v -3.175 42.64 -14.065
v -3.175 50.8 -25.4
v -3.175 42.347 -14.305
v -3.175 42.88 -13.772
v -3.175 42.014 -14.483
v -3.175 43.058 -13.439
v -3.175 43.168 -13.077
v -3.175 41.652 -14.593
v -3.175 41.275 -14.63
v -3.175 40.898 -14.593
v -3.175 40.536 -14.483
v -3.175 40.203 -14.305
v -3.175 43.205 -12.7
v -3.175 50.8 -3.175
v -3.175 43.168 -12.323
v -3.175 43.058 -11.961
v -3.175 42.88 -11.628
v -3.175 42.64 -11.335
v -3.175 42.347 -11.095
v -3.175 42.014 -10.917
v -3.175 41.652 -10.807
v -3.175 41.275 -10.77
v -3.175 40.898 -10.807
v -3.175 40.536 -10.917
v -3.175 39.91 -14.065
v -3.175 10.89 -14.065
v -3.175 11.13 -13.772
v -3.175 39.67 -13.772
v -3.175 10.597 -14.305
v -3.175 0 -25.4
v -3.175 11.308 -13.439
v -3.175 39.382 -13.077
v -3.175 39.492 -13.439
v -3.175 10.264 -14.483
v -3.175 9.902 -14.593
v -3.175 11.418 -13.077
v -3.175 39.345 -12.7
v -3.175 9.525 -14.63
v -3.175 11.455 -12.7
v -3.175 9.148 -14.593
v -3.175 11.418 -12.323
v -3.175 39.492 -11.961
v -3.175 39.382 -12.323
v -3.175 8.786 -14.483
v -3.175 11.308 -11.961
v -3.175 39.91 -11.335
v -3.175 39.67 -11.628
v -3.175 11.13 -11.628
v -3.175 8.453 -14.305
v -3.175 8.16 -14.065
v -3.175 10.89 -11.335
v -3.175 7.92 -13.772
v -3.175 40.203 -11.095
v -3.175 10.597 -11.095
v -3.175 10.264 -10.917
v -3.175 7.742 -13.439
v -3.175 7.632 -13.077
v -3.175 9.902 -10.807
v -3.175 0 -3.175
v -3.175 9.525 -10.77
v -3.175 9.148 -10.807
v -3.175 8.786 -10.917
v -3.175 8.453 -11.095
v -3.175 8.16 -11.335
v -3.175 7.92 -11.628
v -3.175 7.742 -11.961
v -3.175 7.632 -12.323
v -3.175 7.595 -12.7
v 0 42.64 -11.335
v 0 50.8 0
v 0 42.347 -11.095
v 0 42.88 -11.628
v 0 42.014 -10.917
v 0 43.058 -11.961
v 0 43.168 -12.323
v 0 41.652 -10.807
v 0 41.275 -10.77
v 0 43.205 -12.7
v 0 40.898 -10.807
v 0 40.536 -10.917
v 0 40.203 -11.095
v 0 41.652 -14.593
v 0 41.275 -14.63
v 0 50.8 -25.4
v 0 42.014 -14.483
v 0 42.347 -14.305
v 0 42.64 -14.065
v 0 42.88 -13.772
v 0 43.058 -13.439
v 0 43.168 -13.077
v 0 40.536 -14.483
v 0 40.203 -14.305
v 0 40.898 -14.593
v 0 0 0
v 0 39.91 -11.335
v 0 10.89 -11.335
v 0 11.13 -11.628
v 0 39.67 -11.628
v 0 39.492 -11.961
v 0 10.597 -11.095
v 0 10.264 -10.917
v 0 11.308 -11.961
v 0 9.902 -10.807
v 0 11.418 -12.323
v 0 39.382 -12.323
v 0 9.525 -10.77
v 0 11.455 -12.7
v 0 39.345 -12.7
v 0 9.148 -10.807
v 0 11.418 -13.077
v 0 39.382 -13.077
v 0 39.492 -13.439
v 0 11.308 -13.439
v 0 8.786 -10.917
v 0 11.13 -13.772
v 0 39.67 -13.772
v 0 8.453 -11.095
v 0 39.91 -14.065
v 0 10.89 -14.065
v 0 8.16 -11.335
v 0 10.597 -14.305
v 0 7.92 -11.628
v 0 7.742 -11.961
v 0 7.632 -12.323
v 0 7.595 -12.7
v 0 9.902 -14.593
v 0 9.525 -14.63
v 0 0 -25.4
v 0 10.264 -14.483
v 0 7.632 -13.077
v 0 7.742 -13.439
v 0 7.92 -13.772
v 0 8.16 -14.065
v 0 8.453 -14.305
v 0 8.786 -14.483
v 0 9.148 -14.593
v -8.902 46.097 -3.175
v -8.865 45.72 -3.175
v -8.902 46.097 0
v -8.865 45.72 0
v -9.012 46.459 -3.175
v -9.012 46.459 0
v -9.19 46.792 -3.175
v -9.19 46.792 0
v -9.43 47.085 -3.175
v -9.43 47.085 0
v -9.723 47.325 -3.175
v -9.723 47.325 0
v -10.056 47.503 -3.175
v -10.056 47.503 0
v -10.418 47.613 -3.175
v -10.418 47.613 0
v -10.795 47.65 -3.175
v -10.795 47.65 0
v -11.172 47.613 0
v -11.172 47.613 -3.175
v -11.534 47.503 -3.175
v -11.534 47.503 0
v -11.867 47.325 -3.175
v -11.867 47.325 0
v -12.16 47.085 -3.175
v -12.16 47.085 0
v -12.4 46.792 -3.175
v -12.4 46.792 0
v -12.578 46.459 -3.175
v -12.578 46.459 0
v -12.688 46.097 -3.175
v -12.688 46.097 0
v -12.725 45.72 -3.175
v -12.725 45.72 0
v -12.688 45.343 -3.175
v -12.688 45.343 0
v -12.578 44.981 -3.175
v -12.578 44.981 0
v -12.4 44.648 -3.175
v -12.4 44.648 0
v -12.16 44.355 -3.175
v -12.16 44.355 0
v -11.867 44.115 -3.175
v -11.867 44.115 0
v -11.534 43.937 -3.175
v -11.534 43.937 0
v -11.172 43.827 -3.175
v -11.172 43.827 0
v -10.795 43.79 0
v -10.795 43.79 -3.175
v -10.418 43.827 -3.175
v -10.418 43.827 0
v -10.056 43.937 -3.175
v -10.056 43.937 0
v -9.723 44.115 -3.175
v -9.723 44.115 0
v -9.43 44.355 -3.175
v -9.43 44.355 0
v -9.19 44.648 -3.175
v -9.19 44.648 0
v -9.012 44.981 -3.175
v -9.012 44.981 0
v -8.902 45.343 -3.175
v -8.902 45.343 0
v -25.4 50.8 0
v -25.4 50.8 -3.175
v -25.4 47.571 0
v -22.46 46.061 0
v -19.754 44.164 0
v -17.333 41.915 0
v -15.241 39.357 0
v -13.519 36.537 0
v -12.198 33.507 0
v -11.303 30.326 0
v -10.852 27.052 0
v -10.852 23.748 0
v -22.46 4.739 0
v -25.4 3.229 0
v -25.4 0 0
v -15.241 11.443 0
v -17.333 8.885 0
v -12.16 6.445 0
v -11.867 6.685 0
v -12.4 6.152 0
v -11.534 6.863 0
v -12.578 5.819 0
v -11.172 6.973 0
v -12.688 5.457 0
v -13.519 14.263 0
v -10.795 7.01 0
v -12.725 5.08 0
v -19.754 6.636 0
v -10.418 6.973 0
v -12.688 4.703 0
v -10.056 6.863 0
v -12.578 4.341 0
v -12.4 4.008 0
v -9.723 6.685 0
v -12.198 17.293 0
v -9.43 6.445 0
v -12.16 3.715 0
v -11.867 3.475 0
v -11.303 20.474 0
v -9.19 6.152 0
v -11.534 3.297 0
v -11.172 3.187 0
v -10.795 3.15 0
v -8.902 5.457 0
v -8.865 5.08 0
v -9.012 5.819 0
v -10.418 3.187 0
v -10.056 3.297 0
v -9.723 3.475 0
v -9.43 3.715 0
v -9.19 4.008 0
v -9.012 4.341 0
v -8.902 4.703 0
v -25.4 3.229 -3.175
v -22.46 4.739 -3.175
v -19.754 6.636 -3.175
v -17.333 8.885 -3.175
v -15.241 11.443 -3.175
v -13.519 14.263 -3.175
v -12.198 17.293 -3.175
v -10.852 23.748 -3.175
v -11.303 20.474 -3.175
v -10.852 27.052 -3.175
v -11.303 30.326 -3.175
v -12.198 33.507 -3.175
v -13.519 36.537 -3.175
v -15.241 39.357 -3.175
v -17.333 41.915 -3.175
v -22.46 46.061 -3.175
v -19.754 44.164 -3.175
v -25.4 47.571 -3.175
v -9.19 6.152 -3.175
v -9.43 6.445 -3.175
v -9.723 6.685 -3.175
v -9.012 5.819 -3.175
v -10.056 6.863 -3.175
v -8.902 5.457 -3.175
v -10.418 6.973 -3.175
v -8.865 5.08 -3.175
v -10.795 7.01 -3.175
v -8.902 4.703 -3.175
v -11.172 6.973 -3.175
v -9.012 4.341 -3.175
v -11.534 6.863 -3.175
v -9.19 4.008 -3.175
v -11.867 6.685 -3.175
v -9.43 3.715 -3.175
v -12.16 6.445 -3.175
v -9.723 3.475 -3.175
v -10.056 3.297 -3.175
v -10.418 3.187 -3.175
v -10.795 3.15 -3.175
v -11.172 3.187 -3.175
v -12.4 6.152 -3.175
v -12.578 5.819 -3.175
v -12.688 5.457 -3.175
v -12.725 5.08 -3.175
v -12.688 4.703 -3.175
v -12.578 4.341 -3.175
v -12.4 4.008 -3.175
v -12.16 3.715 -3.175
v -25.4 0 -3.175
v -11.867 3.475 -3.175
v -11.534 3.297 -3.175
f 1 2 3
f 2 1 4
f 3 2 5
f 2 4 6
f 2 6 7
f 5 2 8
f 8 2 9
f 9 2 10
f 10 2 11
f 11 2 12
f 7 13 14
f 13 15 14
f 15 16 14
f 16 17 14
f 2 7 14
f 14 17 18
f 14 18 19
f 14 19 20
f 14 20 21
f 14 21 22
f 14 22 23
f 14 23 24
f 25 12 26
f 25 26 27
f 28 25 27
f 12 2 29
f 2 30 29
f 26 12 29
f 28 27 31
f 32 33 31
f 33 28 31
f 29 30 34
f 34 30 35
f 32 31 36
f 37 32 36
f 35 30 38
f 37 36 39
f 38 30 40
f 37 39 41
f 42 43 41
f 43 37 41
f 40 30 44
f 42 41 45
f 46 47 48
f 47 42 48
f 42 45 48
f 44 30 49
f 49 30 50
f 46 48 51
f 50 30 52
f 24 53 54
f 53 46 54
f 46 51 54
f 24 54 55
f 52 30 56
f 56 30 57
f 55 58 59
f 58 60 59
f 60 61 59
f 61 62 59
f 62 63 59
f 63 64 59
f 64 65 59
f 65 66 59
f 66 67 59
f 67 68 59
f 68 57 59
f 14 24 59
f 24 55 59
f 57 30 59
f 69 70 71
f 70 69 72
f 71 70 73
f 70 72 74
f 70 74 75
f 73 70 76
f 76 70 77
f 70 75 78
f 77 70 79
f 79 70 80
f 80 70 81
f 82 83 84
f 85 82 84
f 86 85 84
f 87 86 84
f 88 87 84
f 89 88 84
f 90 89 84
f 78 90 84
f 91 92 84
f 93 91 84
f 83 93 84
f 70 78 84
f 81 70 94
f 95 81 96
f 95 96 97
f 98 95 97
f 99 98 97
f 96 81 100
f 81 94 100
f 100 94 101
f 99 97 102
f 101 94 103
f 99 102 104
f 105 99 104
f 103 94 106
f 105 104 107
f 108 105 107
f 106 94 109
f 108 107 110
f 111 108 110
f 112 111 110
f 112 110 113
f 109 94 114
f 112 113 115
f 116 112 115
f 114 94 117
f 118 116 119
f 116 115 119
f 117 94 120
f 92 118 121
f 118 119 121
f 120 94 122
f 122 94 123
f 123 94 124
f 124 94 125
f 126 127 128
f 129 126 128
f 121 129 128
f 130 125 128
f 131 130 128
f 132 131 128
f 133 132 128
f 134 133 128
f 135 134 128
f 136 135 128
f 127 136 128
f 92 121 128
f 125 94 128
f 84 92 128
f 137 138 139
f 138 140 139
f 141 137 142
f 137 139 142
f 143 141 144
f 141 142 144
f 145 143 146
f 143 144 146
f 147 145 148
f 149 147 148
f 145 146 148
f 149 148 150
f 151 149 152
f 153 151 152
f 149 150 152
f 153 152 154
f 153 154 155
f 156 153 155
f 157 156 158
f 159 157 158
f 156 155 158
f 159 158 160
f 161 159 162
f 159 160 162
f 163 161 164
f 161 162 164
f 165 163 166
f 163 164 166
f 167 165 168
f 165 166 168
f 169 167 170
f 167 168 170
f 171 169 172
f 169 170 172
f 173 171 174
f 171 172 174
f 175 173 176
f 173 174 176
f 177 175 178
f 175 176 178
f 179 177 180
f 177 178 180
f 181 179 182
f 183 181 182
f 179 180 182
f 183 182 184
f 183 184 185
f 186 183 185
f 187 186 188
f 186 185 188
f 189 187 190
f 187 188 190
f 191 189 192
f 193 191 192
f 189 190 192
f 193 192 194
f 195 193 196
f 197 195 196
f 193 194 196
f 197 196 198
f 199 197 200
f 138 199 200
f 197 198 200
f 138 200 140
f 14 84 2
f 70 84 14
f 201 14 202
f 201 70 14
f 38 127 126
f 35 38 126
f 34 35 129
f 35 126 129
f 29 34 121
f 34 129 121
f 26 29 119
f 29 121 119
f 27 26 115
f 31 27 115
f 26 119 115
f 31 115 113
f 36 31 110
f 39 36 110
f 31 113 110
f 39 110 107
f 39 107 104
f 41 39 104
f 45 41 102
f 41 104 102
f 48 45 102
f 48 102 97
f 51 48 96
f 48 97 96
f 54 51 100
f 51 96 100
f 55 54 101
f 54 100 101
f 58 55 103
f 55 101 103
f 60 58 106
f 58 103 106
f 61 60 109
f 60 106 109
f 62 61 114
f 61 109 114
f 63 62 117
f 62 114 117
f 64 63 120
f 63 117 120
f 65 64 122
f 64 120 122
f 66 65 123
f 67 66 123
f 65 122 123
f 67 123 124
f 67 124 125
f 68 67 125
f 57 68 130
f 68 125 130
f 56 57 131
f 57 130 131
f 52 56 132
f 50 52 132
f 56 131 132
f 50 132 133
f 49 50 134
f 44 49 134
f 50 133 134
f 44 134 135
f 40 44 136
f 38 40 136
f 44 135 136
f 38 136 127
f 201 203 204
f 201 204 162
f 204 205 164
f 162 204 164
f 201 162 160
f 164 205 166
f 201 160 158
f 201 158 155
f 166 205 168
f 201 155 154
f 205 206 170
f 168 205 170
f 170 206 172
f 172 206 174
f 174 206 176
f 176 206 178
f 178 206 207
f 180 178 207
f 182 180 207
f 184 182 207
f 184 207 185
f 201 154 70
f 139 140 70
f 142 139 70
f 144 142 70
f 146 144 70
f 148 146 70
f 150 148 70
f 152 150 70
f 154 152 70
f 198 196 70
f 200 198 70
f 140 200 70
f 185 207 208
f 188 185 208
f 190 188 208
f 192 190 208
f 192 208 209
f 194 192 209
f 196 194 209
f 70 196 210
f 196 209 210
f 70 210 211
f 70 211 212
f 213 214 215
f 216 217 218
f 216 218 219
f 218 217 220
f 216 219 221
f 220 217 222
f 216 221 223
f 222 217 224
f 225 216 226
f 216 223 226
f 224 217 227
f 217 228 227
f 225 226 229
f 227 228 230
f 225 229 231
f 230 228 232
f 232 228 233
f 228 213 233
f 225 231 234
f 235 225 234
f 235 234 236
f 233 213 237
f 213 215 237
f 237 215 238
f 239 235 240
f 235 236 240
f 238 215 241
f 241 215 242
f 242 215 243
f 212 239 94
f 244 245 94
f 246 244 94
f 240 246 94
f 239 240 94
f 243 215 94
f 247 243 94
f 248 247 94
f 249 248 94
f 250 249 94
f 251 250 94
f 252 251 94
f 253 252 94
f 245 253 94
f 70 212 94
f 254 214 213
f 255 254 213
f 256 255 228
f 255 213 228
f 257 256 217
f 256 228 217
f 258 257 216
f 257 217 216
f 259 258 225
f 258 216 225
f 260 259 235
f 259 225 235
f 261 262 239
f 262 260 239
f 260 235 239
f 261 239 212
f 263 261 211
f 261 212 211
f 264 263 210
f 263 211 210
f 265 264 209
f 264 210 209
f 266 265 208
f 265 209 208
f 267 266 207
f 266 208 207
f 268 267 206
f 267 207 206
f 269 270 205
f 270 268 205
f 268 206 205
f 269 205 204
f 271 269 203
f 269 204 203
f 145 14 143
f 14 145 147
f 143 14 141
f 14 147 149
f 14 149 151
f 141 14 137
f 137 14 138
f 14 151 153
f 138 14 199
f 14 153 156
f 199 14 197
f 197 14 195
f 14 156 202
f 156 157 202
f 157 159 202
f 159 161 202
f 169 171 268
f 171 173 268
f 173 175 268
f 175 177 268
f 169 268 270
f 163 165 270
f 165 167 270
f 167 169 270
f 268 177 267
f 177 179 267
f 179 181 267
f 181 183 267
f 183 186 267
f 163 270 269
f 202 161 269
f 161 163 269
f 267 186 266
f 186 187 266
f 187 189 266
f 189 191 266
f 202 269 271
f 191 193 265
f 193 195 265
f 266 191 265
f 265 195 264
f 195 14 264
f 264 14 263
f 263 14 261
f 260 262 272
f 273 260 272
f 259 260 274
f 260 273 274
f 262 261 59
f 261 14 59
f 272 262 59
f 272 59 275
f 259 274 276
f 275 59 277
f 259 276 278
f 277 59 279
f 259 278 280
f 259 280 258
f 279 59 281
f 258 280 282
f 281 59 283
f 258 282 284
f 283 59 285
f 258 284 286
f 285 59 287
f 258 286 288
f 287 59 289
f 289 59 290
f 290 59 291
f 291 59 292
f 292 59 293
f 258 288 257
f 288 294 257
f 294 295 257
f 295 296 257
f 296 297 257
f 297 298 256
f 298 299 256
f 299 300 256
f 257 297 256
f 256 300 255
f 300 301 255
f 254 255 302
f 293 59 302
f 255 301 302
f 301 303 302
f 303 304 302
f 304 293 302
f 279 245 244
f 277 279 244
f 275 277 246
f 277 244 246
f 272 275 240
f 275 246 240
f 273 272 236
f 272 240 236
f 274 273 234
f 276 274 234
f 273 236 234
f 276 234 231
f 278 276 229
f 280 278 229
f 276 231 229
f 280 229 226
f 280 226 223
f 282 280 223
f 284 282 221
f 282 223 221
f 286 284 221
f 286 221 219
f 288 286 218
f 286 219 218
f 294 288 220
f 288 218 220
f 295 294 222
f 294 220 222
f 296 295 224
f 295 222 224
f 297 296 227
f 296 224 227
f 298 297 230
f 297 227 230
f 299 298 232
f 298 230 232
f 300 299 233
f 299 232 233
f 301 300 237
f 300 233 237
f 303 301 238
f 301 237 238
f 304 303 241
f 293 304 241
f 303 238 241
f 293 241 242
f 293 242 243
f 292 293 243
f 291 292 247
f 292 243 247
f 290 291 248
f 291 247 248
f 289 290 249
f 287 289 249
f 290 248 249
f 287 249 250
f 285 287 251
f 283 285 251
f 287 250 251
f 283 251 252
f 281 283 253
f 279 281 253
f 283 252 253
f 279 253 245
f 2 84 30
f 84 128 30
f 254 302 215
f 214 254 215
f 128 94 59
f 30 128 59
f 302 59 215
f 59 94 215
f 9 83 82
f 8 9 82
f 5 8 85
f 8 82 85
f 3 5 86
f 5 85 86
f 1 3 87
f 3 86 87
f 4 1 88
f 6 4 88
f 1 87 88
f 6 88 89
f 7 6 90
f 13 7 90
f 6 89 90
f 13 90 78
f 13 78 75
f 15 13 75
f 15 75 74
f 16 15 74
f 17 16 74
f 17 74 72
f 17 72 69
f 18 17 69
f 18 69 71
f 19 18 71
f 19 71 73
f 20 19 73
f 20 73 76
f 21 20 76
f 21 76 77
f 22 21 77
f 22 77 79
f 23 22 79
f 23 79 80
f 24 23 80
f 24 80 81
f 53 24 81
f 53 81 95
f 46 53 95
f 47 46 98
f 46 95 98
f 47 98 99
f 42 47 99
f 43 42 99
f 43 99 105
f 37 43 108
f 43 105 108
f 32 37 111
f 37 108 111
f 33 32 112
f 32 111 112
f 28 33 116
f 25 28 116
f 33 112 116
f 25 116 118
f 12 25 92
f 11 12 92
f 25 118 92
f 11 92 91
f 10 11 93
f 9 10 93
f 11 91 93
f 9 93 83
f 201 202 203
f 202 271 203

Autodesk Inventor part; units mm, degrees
ref_plane "YZ Plane" through (0, 0, 0) normal (1, 0, 0) x (0, 1, 0)
ref_plane "XZ Plane" through (0, 0, 0) normal (0, 1, 0) x (-1, 0, 0)
ref_plane "XY Plane" through (0, 0, 0) normal (0, 0, 1) x (1, 0, 0)
sketch "Sketch1" plane through (0, 0, 0) normal (0, 1, 0) x (-1, 0, 0)
  line L0 (0, 0) -> (0, -25.4)
  line L1 (0, -25.4) -> (3.175, -25.4)
  line L2 (3.175, -25.4) -> (3.175, -3.175)
  line L3 (3.175, -3.175) -> (25.4, -3.175)
  line L4 (25.4, -3.175) -> (25.4, 0)
  line L5 (25.4, 0) -> (0, 0)
  dimension "d0" = 25.4
  dimension "d1" = 3.175
  dimension "d2" = 22.225
  dimension "d3" = 22.225
extrude "Extrusion1" add sketch "Sketch1" along normal blind 50.8
sketch "Sketch2" plane through (-25.4, 0, 0) normal (0, 0, 1) x (1, 0, 0)
  line L0 (22.225, 0) -> (22.225, 50.8) projected
  line L1 (22.225, 0) -> (0, 0) projected
  line L2 (22.225, 50.8) -> (0, 50.8) projected
  circle A0 centre (14.605, 45.72) radius 1.9304
  circle A1 centre (14.605, 5.08) radius 1.9304
  circle A2 centre (-9.525, 25.4) radius 24.13
  line L3 (25.4, 0) -> (22.225, 0) projected
  dimension "d9" = 3.8608
  dimension "d10" = 3.8608
extrude "Extrusion2" cut sketch "Sketch2" against normal blind 63.5
sketch "Sketch3" plane through (0, 0, 0) normal (1, 0, 0) x (0, 0, -1)
  line L0 (25.4, 0) -> (25.4, 50.8) projected
  line L1 (0, 3.2295) -> (0, 47.5705) projected
  line L2 (0, 50.8) -> (25.4, 50.8) projected
  line L3 (25.4, 0) -> (3.175, 0) projected
  circle A0 centre (12.7, 9.525) radius 1.9304
  circle A1 centre (12.7, 41.275) radius 1.9304
  point P0 (0, 0)
  point P1 (12.7, 50.8)
  point P2 (14.2875, 0)
  dimension "d29" = 9.525
  dimension "d30" = 12.7
  dimension "d31" = 9.525
  dimension "d32" = 12.7
  dimension "d33" = 3.8608
  dimension "d34" = 3.8608
extrude "Extrusion3" cut sketch "Sketch3" against normal blind 63.5
properties part number "Frame Bracket"
